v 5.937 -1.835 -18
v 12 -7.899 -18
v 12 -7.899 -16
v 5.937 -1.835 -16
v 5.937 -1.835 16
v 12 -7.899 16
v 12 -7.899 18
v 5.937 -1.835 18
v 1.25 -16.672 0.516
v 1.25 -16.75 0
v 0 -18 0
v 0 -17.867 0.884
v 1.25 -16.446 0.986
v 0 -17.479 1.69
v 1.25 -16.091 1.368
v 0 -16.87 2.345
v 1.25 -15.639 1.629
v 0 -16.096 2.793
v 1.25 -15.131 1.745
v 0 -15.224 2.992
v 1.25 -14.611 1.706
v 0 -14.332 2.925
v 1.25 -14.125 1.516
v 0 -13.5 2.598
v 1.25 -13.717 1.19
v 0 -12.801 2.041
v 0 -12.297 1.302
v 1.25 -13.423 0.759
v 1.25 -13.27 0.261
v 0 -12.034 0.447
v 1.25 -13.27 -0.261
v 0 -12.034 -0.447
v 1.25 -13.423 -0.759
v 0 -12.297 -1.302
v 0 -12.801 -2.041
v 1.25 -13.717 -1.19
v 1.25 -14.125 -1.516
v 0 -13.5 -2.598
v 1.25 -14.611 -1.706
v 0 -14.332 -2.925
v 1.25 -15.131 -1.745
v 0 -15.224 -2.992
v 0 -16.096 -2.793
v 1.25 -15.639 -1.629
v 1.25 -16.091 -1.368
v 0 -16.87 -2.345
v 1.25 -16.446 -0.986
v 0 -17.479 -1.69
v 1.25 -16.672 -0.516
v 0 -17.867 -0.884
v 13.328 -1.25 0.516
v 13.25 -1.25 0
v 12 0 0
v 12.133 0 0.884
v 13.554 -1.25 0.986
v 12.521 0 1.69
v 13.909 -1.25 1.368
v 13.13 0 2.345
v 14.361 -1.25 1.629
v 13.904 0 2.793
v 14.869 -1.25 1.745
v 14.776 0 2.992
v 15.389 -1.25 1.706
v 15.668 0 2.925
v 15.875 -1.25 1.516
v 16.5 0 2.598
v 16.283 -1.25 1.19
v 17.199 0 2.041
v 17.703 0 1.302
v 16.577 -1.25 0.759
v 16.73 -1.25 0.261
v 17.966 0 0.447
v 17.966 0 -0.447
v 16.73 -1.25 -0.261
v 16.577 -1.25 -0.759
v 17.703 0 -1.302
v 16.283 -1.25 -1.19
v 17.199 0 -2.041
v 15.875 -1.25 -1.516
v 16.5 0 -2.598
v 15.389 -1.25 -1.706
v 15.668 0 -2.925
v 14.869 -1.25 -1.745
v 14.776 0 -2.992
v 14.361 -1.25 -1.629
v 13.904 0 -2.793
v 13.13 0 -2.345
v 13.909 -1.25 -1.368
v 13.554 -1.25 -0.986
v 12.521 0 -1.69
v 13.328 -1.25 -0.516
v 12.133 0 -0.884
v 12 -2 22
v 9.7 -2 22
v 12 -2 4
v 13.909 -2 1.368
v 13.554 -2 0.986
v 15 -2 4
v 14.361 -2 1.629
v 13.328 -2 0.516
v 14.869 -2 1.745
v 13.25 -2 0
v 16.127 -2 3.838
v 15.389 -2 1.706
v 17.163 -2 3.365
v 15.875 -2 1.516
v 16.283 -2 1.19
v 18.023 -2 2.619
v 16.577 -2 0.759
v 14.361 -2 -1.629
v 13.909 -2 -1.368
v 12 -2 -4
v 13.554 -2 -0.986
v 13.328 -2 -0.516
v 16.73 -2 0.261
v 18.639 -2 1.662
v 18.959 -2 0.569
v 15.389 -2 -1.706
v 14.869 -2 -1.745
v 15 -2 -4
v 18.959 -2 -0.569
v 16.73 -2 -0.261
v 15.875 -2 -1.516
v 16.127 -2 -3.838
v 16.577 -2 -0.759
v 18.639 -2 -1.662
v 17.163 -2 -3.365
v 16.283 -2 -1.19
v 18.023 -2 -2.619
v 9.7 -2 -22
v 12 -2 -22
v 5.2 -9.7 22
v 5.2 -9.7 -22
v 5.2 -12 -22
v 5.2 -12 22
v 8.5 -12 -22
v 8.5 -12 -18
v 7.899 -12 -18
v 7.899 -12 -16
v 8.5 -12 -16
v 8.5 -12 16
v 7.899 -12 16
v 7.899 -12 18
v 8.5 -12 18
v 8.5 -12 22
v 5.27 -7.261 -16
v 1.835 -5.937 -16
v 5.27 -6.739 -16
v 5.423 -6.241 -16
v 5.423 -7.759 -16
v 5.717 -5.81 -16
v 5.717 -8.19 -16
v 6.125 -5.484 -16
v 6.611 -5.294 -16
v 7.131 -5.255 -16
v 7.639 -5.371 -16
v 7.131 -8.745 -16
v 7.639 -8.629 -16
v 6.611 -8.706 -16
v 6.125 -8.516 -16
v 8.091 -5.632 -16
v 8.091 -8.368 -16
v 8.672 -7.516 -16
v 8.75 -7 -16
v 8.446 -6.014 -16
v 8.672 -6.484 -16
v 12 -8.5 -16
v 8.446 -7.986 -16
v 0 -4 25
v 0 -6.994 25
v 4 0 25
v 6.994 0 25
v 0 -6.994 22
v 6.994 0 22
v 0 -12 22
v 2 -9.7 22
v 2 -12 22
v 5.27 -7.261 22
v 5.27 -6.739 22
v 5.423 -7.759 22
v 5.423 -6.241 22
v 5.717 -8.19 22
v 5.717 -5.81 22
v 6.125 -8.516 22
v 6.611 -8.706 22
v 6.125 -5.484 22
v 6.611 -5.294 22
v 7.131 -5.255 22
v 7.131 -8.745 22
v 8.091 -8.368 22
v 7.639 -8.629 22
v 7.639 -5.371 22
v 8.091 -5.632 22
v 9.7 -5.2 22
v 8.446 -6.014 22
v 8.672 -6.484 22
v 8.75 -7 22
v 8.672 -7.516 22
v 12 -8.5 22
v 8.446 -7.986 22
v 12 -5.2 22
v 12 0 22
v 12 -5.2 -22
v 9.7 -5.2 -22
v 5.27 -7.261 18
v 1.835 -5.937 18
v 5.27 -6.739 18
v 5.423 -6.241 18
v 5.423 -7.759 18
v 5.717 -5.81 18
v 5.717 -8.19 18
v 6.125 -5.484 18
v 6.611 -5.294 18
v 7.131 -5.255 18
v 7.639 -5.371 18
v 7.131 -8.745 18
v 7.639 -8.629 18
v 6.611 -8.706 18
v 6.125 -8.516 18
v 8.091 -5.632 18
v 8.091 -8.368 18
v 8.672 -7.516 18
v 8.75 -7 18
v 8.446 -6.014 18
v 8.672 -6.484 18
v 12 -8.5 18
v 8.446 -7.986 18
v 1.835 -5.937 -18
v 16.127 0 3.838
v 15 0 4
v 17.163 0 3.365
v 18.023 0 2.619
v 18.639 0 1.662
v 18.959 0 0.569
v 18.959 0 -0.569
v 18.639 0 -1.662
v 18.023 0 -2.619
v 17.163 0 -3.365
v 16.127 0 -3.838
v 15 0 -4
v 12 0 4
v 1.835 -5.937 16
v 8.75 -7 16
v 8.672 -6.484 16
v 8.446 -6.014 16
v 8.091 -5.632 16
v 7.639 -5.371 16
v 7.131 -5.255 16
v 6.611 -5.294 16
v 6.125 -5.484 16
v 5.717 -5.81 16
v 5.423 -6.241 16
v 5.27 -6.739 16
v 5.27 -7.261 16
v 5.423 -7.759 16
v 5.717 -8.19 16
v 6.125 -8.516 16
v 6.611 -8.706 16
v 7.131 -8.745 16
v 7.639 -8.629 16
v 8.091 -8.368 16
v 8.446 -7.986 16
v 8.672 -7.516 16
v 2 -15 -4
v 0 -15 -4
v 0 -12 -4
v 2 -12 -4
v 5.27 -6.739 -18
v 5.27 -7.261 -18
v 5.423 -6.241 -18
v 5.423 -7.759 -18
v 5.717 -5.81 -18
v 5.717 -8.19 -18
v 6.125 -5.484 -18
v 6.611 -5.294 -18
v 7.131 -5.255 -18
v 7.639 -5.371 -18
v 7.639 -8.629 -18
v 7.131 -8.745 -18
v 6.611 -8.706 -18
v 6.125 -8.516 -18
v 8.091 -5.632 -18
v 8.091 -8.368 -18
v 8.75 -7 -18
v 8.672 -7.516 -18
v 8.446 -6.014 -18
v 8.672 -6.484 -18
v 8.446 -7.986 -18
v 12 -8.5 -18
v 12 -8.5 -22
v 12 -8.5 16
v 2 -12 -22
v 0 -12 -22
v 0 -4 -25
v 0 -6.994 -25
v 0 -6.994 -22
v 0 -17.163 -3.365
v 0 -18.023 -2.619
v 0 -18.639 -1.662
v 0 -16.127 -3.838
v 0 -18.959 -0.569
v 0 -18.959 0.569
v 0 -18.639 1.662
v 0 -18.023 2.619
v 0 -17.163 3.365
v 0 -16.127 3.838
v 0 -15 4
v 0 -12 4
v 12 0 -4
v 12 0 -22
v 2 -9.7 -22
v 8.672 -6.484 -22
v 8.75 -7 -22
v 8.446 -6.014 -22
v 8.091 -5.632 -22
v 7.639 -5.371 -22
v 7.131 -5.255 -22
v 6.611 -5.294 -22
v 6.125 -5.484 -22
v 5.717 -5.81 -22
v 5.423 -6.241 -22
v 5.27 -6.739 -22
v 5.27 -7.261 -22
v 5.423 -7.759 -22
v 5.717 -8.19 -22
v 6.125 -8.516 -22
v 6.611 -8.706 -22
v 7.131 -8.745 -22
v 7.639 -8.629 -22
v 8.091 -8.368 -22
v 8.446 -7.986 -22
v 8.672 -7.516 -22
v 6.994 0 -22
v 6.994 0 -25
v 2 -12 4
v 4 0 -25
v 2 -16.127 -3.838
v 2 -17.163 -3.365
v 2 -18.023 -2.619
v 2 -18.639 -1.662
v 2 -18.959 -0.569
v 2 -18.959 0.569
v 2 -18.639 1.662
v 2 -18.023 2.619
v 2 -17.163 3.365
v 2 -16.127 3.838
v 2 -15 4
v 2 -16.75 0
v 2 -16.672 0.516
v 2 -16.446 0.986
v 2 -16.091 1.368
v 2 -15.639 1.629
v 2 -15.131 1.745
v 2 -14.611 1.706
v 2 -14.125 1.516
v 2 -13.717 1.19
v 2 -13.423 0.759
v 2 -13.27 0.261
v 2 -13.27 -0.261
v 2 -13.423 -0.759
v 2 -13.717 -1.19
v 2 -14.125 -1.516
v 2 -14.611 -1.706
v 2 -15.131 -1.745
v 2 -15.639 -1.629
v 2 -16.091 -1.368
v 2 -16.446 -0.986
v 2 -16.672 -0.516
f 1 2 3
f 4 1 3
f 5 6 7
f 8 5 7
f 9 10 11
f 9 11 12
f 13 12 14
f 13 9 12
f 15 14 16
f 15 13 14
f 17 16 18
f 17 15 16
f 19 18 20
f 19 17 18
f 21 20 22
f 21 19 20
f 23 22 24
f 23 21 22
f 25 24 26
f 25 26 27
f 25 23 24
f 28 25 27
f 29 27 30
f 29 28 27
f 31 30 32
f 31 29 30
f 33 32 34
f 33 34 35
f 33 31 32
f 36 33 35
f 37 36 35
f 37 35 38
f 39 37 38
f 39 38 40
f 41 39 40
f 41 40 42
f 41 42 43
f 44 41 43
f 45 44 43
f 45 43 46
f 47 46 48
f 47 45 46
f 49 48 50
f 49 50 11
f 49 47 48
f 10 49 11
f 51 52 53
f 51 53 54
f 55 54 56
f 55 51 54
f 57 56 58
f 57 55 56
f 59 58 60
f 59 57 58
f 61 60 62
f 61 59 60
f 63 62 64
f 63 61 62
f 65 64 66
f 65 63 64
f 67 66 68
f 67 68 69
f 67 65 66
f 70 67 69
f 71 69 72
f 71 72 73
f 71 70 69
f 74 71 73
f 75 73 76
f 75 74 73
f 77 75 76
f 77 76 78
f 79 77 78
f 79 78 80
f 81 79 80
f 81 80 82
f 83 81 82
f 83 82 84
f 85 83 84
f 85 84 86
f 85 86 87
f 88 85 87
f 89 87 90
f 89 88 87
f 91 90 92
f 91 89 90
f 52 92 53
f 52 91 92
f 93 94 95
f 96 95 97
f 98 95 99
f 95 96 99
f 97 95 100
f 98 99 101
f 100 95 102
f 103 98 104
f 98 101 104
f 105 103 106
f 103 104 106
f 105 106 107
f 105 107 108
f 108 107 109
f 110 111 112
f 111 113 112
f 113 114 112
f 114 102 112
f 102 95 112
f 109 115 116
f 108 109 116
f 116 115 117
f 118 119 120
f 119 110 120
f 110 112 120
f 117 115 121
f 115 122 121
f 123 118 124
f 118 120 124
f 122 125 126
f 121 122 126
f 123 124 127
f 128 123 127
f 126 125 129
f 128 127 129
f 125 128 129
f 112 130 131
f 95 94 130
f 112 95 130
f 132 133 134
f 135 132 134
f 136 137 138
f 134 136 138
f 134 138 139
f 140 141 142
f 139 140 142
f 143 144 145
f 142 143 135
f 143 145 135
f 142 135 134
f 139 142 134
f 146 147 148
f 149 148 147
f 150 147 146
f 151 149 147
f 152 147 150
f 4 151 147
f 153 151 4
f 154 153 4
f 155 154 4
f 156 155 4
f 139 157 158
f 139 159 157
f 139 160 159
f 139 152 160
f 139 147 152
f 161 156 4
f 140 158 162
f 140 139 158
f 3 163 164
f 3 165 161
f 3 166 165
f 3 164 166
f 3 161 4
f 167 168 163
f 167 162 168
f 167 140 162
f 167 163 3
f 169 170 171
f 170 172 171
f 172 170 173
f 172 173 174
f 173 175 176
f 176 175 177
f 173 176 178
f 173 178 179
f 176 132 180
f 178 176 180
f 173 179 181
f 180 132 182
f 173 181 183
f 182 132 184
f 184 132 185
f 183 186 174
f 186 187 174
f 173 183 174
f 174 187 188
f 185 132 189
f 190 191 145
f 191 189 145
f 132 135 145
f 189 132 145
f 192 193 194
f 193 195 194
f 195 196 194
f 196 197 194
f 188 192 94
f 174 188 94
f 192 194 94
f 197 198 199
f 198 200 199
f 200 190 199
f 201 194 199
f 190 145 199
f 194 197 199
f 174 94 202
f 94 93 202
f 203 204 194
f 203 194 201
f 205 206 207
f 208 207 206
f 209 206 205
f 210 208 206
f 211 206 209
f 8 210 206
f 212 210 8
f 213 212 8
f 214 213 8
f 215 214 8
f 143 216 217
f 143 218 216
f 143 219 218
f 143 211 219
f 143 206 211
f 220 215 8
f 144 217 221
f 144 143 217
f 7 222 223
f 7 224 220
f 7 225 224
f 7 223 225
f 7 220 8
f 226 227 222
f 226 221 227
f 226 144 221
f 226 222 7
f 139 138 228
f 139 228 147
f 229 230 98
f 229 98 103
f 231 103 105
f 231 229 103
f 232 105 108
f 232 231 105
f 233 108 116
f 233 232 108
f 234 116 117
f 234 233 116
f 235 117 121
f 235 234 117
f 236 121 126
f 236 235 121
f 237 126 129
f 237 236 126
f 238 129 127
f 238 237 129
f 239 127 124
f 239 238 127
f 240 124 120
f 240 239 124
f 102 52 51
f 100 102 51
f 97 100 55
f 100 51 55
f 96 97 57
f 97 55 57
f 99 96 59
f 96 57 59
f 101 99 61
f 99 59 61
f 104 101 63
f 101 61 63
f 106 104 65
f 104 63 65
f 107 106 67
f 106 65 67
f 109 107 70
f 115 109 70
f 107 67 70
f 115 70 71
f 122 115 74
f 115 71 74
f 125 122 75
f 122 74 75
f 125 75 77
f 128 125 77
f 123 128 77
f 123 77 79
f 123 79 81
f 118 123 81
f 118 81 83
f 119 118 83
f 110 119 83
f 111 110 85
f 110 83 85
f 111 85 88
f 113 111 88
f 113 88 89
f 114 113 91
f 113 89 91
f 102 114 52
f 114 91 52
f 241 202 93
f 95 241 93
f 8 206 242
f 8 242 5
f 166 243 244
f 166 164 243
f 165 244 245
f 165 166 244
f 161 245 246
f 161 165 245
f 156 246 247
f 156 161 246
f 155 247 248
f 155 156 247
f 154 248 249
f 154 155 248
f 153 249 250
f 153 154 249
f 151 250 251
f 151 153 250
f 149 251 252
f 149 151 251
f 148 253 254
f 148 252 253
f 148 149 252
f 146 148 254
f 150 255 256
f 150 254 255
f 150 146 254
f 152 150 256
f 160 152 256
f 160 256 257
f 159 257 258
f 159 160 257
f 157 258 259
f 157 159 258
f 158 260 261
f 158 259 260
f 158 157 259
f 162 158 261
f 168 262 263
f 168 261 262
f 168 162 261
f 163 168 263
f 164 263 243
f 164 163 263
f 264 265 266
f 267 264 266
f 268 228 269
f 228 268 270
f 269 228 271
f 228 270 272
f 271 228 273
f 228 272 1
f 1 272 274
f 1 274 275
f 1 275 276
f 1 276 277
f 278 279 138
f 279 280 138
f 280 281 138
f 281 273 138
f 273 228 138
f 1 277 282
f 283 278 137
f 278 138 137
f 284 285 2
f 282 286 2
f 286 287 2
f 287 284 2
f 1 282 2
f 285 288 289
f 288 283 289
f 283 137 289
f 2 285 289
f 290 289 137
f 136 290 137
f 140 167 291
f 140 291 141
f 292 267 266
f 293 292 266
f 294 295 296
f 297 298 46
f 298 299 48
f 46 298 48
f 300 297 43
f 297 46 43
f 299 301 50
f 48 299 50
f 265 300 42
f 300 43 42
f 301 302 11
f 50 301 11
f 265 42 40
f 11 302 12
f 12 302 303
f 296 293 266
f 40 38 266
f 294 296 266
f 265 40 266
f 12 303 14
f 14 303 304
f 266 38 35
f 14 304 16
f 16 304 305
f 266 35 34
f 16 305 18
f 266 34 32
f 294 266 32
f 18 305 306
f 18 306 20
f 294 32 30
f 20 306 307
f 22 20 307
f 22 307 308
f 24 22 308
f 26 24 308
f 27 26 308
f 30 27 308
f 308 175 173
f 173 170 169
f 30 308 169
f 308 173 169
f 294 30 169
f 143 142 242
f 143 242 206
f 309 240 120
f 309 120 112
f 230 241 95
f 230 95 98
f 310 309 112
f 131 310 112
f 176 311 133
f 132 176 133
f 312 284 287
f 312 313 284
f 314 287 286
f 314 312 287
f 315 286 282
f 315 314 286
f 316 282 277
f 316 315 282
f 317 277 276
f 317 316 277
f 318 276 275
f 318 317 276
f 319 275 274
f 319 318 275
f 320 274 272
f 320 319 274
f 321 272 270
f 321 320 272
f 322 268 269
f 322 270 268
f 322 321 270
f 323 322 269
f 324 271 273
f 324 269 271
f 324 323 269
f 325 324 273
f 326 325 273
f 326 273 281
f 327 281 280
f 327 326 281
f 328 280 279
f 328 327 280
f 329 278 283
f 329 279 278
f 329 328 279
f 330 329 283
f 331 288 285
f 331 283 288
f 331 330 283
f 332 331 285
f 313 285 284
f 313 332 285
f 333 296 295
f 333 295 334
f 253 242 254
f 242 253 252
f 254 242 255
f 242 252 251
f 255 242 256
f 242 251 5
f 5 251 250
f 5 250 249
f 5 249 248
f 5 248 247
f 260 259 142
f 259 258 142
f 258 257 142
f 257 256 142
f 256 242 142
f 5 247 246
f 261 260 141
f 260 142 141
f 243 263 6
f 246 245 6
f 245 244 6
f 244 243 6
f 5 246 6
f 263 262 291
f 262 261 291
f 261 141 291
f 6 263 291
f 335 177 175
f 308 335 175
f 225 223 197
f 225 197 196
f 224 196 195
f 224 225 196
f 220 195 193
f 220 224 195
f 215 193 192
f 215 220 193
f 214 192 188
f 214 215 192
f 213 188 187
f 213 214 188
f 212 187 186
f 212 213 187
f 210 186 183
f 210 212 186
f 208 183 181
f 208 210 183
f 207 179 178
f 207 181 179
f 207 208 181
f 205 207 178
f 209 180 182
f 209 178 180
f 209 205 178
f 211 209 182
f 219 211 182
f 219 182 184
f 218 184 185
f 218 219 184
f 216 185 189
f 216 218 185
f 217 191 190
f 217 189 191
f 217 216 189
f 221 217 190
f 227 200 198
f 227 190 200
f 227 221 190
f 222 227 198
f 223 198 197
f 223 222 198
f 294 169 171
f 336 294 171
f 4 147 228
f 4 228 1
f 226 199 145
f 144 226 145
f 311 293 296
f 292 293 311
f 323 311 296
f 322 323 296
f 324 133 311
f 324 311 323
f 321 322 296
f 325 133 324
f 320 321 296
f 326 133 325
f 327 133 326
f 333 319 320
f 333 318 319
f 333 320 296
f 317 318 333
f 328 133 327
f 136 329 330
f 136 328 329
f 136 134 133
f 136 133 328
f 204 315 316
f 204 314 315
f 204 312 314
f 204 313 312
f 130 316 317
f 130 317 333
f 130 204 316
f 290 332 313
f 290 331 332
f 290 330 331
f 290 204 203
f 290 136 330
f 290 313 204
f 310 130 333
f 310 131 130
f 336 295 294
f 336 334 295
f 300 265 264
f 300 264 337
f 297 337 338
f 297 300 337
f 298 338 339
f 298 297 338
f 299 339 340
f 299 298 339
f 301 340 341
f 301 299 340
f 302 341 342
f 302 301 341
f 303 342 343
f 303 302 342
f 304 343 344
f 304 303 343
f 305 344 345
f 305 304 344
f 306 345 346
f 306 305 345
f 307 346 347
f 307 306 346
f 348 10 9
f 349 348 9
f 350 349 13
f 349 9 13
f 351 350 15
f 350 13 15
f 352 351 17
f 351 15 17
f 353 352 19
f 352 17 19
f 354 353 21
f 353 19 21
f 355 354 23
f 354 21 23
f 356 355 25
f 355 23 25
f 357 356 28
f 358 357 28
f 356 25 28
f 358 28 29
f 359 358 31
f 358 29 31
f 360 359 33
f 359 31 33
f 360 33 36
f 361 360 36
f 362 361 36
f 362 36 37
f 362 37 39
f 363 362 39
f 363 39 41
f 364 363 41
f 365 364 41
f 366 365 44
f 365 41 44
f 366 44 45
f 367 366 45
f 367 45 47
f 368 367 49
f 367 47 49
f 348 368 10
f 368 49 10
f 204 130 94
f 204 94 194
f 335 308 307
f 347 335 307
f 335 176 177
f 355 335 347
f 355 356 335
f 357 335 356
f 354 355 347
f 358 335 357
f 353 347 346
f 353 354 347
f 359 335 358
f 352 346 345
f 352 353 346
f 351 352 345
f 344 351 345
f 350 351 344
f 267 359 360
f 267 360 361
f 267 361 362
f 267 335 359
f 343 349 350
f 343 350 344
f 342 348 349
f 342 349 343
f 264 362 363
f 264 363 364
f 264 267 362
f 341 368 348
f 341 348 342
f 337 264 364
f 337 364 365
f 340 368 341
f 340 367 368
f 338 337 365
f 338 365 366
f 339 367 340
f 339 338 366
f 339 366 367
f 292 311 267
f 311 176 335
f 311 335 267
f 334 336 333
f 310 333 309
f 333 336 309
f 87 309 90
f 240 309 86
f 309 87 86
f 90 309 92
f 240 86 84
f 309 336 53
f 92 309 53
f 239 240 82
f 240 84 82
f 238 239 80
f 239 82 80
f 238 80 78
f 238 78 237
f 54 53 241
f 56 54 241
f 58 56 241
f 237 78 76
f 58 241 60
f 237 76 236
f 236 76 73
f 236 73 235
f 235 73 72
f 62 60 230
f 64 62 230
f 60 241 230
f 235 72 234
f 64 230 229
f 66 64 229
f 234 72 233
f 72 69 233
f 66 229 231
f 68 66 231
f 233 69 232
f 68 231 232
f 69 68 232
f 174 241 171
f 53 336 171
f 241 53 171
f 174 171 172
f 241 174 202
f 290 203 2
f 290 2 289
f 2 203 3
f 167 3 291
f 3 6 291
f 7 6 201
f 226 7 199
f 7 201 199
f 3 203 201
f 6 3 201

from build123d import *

# Parameters (mm, degrees)
SKETCH_R        = 1.75
PAD_DEPTH       = 25
SKETCH001_W     = 18
SKETCH001_H     = 3
POCKET_DEPTH    = 9.55
SKETCH002_W     = 5.8
SKETCH002_H     = 2
POCKET001_DEPTH = 9
SKETCH003_W     = 3.2
SKETCH003_H     = 2.3
SKETCH003_W_2   = 2.3
SKETCH003_H_2   = 3.2
POCKET002_DEPTH = 50.001
SKETCH004_R     = 1.75
PAD001_DEPTH    = 2
SKETCH005_R     = 1.75
PAD002_DEPTH    = 2
CHAMFER_SIZE    = 1.25


with BuildPart() as part:
    # Sketch → Pad (new body, symmetric)
    with BuildSketch(Plane.XY):
        Polygon((0, -4), (4, 0), (12, 0), (12, -8.5), (8.5, -12), (0, -12), align=None)
        with Locations((7, -7)):
            Circle(SKETCH_R, mode=Mode.SUBTRACT)
    extrude(amount=PAD_DEPTH, both=True)

    # Sketch001 (on Face4 of Pad) → Pocket (cut)
    with BuildSketch(Plane(origin=(10.25, -10.25, 0), x_dir=(0.707107, 0.707107, 0), z_dir=(0.707107, -0.707107, 0))):
        with Locations((0, 23.5)):
            Rectangle(SKETCH001_W, SKETCH001_H)
        with Locations((0, -23.5)):
            Rectangle(SKETCH001_W, SKETCH001_H)
    extrude(amount=-POCKET_DEPTH, mode=Mode.SUBTRACT)

    # Sketch002 (on Face12 of Pocket) → Pocket001 (cut)
    with BuildSketch(Plane(origin=(10.25, -10.25, 0), x_dir=(0.707107, 0.707107, 0), z_dir=(0.707107, -0.707107, 0))):
        with Locations((0, 17)):
            Rectangle(SKETCH002_W, SKETCH002_H)
        with Locations((0, -17)):
            Rectangle(SKETCH002_W, SKETCH002_H)
    extrude(amount=-POCKET001_DEPTH, mode=Mode.SUBTRACT)

    # Sketch003 (on Face4 of Pocket001) → Pocket002 (cut, through all)
    with BuildSketch(Plane(origin=(0, 0, -25), x_dir=(1, 0, 0), z_dir=(0, 0, -1))):
        with Locations((3.6, 10.85)):
            Rectangle(SKETCH003_W, SKETCH003_H)
        with Locations((10.85, 3.6)):
            Rectangle(SKETCH003_W_2, SKETCH003_H_2)
    extrude(amount=-POCKET002_DEPTH, mode=Mode.SUBTRACT)

    # Sketch004 (on Face2 of Pocket002) → Pad001 (join)
    with BuildSketch(Plane(origin=(0, 0, 0), x_dir=(0, -1, 0), z_dir=(-1, 0, 0))):
        with BuildLine():
            Line((12, 4), (15, 4))
            ThreePointArc((15, -4), (19, 0), (15, 4))
            Line((15, -4), (12, -4))
            Line((12, -4), (12, 4))
        make_face()
        with Locations((15, 0)):
            Circle(SKETCH004_R, mode=Mode.SUBTRACT)
    extrude(amount=-PAD001_DEPTH)

    # Sketch005 (on Face3 of Pad001) → Pad002 (join)
    with BuildSketch(Plane(origin=(0, 0, 0), x_dir=(-1, 0, 0), z_dir=(0, 1, 0))):
        with BuildLine():
            Line((-12, 4), (-15, 4))
            ThreePointArc((-15, 4), (-19, 0), (-15, -4))
            Line((-15, -4), (-12, -4))
            Line((-12, -4), (-12, 4))
        make_face()
        with Locations((-15, 0)):
            Circle(SKETCH005_R, mode=Mode.SUBTRACT)
    extrude(amount=-PAD002_DEPTH)

    # Chamfer
    chamfer_edges = [part.edges().sort_by_distance(p)[0] for p in [
        (16.75, 0, 0),
        (0, -13.25, 0),
    ]]
    chamfer(chamfer_edges, length=CHAMFER_SIZE)


solid = part.part
